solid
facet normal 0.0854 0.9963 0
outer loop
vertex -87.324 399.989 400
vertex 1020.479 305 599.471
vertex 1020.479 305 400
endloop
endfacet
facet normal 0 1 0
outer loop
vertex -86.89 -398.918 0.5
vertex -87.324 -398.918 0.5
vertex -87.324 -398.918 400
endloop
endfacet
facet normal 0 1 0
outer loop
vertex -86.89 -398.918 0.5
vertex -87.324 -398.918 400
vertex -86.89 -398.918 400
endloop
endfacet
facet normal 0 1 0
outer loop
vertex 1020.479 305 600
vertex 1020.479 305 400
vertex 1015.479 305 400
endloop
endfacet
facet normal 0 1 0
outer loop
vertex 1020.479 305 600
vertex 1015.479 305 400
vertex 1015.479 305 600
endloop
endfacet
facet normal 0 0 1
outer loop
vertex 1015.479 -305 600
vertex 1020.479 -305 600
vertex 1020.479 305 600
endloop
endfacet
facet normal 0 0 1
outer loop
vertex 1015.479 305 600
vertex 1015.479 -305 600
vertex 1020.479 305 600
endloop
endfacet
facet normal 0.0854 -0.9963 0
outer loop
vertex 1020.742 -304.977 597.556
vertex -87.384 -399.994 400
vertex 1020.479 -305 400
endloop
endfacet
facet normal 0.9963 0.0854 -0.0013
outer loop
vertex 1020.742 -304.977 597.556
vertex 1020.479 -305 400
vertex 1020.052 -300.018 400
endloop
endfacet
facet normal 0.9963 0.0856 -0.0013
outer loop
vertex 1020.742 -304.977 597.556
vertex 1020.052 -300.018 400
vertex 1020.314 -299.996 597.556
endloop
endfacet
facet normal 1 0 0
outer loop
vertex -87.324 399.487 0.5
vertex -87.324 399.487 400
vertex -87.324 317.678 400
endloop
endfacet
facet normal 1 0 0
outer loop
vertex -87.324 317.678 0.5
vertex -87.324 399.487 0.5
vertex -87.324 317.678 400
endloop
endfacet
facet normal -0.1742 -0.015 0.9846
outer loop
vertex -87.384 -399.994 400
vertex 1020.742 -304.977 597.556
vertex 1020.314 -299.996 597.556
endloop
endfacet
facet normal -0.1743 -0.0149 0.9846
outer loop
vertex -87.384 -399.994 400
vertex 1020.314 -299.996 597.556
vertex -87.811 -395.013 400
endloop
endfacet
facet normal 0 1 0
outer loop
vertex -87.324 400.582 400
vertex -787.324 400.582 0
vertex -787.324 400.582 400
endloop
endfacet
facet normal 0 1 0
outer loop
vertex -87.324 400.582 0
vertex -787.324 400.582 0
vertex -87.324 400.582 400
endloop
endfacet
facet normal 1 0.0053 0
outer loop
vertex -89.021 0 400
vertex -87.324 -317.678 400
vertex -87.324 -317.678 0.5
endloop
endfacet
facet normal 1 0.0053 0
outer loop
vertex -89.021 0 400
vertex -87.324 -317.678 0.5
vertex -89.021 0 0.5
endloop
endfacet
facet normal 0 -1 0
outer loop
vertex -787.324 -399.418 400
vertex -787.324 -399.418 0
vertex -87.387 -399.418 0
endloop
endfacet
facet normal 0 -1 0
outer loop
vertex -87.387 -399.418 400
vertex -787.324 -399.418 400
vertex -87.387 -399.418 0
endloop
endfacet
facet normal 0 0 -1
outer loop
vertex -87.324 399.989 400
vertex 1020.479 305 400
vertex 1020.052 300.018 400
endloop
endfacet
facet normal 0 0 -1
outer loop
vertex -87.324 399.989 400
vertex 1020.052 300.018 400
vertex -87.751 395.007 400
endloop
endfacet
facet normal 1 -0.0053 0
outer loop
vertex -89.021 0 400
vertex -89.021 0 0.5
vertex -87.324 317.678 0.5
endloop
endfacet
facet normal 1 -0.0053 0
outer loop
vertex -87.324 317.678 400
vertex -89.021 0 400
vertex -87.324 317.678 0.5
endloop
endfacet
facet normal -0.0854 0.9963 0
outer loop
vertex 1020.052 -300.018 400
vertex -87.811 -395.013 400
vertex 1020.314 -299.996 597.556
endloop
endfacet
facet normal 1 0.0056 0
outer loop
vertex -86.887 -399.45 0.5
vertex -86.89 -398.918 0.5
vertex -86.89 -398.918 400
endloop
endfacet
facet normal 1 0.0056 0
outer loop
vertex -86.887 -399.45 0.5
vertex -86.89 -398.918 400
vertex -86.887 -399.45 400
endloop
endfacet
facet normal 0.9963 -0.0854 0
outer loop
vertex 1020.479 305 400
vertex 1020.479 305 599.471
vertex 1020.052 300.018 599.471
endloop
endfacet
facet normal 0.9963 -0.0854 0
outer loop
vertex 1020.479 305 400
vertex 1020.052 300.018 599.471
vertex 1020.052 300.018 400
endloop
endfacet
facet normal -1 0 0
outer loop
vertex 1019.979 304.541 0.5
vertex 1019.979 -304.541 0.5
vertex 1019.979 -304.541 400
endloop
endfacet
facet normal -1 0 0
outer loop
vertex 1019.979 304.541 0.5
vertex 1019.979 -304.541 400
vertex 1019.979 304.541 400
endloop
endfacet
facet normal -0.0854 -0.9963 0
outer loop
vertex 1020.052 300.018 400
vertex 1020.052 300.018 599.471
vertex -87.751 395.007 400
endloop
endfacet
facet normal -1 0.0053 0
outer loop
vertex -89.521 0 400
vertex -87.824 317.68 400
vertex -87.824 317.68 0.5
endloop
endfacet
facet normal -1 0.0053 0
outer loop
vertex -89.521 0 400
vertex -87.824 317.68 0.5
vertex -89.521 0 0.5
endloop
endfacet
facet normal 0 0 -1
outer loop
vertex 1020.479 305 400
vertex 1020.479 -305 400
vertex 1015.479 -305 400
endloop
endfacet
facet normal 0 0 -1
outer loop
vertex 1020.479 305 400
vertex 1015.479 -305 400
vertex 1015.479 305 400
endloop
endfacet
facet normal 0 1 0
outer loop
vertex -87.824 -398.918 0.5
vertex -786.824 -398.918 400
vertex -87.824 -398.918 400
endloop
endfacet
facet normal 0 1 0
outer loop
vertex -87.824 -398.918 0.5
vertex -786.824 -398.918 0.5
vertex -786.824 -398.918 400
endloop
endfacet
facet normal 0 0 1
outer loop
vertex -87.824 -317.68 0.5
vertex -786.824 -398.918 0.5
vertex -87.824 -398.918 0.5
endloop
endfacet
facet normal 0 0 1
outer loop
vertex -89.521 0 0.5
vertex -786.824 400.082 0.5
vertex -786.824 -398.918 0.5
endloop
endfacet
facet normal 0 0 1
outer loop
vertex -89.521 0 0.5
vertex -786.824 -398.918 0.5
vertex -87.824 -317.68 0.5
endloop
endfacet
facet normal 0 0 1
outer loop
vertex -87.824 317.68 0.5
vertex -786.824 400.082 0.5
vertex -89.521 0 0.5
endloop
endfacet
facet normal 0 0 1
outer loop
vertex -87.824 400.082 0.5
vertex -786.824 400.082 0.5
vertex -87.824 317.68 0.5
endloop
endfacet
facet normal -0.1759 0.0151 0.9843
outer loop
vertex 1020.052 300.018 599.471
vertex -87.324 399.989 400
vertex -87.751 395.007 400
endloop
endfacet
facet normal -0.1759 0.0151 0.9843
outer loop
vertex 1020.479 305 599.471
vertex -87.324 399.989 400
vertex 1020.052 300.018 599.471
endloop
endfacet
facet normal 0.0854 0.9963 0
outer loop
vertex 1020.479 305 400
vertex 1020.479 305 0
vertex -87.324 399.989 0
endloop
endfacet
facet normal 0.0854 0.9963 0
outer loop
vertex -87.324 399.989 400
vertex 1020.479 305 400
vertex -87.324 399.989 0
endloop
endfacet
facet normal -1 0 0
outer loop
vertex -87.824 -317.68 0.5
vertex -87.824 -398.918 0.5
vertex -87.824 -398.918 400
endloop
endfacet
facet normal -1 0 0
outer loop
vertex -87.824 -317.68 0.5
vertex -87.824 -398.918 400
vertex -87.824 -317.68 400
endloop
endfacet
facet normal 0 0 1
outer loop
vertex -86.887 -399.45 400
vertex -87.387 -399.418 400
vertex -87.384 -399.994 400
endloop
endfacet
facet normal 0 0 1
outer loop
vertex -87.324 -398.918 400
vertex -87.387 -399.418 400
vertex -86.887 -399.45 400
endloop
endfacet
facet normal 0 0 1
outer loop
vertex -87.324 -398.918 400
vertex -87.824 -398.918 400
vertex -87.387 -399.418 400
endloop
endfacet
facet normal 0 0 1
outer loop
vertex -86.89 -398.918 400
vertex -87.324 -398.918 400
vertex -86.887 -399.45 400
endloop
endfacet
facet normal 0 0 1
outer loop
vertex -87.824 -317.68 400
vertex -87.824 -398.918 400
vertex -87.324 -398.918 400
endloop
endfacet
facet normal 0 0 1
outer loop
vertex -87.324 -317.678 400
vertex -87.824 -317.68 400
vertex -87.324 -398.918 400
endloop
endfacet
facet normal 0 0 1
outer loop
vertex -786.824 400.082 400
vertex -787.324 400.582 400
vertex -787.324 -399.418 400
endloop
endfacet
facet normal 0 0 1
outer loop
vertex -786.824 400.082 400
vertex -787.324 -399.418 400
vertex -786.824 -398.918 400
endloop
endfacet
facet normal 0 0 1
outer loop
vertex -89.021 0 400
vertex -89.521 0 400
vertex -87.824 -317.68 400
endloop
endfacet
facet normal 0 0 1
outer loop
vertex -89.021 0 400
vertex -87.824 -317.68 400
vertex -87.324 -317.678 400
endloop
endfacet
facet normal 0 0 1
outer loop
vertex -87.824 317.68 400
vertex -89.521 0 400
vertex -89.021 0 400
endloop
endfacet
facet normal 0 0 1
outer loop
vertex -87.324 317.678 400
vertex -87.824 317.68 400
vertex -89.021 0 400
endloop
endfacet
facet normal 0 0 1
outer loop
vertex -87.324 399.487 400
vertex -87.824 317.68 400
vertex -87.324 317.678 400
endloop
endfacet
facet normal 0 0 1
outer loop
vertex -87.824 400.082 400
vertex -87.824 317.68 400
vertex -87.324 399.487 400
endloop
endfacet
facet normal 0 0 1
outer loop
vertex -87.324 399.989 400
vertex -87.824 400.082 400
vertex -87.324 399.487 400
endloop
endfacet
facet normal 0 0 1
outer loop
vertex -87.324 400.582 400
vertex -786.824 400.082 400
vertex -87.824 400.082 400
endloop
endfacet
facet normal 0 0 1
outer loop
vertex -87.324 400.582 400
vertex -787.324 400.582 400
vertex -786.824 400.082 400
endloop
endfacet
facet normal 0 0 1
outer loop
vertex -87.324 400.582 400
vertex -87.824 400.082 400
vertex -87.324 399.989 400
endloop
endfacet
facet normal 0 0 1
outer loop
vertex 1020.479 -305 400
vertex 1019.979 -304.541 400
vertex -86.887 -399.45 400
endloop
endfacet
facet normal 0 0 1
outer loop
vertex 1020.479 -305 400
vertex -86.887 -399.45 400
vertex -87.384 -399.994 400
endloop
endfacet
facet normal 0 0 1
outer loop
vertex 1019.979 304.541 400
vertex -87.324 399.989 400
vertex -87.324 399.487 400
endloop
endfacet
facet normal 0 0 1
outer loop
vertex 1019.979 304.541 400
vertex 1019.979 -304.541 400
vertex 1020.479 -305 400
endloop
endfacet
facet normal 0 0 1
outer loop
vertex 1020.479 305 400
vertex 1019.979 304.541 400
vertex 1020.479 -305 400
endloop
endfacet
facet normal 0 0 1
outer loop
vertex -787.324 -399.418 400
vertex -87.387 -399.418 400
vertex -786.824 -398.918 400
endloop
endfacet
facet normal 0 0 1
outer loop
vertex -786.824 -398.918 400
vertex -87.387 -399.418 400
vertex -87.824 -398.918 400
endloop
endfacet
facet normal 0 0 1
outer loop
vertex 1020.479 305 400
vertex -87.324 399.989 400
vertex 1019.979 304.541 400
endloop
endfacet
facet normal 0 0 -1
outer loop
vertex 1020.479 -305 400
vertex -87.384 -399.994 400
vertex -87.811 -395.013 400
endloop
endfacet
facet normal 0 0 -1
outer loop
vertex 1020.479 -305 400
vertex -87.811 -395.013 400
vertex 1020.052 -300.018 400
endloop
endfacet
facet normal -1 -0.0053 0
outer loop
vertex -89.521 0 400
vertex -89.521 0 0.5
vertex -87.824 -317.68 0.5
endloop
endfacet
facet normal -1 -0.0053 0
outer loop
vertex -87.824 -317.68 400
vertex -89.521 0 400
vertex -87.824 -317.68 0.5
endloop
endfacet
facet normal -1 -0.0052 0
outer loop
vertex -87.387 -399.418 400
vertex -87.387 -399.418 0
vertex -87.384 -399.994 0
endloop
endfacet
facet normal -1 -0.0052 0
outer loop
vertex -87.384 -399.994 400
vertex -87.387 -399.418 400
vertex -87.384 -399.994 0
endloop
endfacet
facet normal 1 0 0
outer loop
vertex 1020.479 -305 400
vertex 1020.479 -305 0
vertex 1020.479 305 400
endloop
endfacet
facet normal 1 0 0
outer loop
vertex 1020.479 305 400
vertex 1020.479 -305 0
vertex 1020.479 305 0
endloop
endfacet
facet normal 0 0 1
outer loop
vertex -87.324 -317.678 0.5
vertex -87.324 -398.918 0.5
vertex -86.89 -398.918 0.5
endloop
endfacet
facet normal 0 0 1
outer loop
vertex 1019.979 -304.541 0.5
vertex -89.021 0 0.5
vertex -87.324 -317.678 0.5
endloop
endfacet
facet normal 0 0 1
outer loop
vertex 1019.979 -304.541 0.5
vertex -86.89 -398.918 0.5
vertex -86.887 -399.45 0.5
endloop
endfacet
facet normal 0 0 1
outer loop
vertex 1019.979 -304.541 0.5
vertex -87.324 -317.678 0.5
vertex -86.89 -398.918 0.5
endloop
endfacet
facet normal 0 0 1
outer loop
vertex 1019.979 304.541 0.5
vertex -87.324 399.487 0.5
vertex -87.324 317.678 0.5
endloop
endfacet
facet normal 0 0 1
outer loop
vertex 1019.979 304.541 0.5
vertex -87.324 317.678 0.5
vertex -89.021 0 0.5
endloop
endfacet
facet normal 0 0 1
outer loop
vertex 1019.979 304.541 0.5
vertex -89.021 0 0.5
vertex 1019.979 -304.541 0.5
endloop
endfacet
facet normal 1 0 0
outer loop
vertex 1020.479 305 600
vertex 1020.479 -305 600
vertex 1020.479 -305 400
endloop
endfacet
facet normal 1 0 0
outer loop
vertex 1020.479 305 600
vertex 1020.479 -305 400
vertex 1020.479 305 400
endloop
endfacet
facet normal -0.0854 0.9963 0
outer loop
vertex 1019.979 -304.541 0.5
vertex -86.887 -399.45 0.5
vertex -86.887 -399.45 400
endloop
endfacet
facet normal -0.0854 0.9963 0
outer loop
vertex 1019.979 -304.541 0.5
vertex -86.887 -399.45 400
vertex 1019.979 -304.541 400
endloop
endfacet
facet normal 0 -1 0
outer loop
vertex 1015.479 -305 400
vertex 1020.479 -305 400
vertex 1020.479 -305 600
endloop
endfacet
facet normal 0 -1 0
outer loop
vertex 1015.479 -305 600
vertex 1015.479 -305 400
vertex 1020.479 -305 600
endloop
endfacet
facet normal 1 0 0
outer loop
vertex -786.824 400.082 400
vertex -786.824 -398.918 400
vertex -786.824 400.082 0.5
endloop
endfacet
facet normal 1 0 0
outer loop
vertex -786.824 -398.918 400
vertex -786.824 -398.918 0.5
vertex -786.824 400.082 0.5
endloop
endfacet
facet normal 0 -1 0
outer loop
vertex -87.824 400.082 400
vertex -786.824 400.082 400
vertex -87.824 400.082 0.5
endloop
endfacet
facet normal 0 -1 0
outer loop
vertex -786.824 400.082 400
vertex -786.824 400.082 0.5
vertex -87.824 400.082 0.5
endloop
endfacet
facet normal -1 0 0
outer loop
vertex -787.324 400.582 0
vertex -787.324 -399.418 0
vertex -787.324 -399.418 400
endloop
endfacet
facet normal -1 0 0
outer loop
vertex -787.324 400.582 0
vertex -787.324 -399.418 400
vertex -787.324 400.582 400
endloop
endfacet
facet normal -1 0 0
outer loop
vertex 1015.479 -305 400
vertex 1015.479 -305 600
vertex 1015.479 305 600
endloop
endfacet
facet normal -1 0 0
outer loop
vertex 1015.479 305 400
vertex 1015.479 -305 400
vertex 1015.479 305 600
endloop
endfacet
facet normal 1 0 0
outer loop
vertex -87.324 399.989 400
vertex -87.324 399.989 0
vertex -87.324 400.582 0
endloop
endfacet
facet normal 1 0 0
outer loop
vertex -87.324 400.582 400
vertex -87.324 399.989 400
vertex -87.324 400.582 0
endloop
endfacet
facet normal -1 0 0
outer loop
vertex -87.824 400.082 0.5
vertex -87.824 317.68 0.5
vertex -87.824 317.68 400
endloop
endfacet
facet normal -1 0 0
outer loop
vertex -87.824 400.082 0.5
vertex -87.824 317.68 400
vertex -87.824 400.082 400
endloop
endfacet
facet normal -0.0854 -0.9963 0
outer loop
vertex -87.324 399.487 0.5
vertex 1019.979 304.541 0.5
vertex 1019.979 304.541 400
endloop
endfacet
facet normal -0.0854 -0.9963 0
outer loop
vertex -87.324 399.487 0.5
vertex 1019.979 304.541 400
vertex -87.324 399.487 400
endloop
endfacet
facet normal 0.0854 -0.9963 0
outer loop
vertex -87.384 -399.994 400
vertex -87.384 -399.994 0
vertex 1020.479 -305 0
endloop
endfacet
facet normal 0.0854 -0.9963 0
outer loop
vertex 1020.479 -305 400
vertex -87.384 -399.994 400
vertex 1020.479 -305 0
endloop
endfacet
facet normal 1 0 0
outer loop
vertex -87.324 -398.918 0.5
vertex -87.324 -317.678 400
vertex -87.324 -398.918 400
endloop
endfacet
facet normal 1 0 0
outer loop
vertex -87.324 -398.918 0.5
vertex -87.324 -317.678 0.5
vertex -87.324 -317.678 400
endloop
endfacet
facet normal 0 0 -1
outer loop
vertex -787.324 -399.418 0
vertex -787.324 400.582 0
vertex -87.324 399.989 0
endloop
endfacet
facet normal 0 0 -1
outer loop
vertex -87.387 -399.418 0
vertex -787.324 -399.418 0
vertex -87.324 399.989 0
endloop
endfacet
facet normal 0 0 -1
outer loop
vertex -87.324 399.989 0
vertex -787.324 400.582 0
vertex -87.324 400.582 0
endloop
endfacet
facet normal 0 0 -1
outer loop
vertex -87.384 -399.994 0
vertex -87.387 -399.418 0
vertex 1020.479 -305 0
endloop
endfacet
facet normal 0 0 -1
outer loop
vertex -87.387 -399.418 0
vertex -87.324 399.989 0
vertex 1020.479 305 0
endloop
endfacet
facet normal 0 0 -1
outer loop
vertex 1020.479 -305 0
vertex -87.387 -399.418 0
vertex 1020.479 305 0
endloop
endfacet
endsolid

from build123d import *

# Parameters (mm, degrees)
F1_W      = 700
F1_H      = 800
F2_DEPTH  = 400
F3_T      = -0.5
F4_DEPTH  = 400
F5_T      = -0.5
F8_DEPTH  = 5
F6_W      = 610
F6_H      = 200
F9_DEPTH  = 5
F11_DEPTH = 5


# Not quite as in the source:
# - a shell that OpenCascade refuses in one call is made with other operations: the cavity is built on its own and cut out


with BuildPart() as f2:
    # F1 (on Top) → F2 (new body)
    with BuildSketch(Plane.XY):
        with Locations((-437.323653698, 0.5818843842)):
            Rectangle(F1_W, F1_H)
    extrude(amount=F2_DEPTH)

    # F3
    f3_openings = [f2.faces().sort_by_distance(p)[0] for p in [
        (-437.323654, 0.581884, 400),
    ]]
    offset(amount=F3_T, openings=f3_openings)

    # F0 (on Top) → F4 (join)
    with BuildSketch(Plane.XY):
        Polygon((-87.3838496962, 399.99429066), (-89.5210065554, 0), (1020.4789934446, 0), (1020.4789934446, 305), align=None)
        Polygon((-89.5210065554, 0), (-87.3838496962, -399.99429066), (1020.4789934446, -305), (1020.4789934446, 0), align=None)
    extrude(amount=F4_DEPTH)

    # F5: a shell. OpenCascade refuses it in one call, so the cavity is built on its own and cut out:
    # the body offset inwards by the wall thickness, plus a prism from it out through each open face.
    f5_core = offset(f2.part, amount=F5_T, kind=Kind.INTERSECTION, mode=Mode.PRIVATE)
    f5_exits = [f5_core.faces().sort_by_distance(p)[0] for p in [
        (441.073229, 0.000123, 399.5),
    ]]
    add(f5_core, mode=Mode.SUBTRACT)
    extrude(f5_exits, amount=-F5_T, mode=Mode.SUBTRACT)


with BuildPart() as f8:
    # F7 (on face) → F8 (new body)
    with BuildSketch(Plane(origin=(33.409614528, -389.6367906126, 0), x_dir=(0.9963439994, 0.0854320479, 0), z_dir=(0.0854320479, -0.9963439994, 0))):
        Polygon((990.954875946, 597.5561738014), (-121.2367056898, 400), (990.6913470501, 400), align=None)
    extrude(amount=-F8_DEPTH)


with BuildPart() as f9:
    # F6 (on face) → F9 (new body)
    with BuildSketch(Plane.YZ.offset(1020.4789934446)):
        with Locations((0, 500)):
            Rectangle(F6_W, F6_H)
    extrude(amount=-F9_DEPTH)


with BuildPart() as f11:
    # F10 (on face) → F11 (new body)
    with BuildSketch(Plane(origin=(33.409614528, 389.6367906126, 0), x_dir=(-0.9963439994, 0.0854320479, 0), z_dir=(0.0854320479, 0.9963439994, 0))):
        Polygon((121.1762888074, 400), (-990.6913470501, 599.4713306427), (-990.6913470501, 400), align=None)
    extrude(amount=-F11_DEPTH)


solid = Compound([f2.part, f8.part, f9.part, f11.part])
